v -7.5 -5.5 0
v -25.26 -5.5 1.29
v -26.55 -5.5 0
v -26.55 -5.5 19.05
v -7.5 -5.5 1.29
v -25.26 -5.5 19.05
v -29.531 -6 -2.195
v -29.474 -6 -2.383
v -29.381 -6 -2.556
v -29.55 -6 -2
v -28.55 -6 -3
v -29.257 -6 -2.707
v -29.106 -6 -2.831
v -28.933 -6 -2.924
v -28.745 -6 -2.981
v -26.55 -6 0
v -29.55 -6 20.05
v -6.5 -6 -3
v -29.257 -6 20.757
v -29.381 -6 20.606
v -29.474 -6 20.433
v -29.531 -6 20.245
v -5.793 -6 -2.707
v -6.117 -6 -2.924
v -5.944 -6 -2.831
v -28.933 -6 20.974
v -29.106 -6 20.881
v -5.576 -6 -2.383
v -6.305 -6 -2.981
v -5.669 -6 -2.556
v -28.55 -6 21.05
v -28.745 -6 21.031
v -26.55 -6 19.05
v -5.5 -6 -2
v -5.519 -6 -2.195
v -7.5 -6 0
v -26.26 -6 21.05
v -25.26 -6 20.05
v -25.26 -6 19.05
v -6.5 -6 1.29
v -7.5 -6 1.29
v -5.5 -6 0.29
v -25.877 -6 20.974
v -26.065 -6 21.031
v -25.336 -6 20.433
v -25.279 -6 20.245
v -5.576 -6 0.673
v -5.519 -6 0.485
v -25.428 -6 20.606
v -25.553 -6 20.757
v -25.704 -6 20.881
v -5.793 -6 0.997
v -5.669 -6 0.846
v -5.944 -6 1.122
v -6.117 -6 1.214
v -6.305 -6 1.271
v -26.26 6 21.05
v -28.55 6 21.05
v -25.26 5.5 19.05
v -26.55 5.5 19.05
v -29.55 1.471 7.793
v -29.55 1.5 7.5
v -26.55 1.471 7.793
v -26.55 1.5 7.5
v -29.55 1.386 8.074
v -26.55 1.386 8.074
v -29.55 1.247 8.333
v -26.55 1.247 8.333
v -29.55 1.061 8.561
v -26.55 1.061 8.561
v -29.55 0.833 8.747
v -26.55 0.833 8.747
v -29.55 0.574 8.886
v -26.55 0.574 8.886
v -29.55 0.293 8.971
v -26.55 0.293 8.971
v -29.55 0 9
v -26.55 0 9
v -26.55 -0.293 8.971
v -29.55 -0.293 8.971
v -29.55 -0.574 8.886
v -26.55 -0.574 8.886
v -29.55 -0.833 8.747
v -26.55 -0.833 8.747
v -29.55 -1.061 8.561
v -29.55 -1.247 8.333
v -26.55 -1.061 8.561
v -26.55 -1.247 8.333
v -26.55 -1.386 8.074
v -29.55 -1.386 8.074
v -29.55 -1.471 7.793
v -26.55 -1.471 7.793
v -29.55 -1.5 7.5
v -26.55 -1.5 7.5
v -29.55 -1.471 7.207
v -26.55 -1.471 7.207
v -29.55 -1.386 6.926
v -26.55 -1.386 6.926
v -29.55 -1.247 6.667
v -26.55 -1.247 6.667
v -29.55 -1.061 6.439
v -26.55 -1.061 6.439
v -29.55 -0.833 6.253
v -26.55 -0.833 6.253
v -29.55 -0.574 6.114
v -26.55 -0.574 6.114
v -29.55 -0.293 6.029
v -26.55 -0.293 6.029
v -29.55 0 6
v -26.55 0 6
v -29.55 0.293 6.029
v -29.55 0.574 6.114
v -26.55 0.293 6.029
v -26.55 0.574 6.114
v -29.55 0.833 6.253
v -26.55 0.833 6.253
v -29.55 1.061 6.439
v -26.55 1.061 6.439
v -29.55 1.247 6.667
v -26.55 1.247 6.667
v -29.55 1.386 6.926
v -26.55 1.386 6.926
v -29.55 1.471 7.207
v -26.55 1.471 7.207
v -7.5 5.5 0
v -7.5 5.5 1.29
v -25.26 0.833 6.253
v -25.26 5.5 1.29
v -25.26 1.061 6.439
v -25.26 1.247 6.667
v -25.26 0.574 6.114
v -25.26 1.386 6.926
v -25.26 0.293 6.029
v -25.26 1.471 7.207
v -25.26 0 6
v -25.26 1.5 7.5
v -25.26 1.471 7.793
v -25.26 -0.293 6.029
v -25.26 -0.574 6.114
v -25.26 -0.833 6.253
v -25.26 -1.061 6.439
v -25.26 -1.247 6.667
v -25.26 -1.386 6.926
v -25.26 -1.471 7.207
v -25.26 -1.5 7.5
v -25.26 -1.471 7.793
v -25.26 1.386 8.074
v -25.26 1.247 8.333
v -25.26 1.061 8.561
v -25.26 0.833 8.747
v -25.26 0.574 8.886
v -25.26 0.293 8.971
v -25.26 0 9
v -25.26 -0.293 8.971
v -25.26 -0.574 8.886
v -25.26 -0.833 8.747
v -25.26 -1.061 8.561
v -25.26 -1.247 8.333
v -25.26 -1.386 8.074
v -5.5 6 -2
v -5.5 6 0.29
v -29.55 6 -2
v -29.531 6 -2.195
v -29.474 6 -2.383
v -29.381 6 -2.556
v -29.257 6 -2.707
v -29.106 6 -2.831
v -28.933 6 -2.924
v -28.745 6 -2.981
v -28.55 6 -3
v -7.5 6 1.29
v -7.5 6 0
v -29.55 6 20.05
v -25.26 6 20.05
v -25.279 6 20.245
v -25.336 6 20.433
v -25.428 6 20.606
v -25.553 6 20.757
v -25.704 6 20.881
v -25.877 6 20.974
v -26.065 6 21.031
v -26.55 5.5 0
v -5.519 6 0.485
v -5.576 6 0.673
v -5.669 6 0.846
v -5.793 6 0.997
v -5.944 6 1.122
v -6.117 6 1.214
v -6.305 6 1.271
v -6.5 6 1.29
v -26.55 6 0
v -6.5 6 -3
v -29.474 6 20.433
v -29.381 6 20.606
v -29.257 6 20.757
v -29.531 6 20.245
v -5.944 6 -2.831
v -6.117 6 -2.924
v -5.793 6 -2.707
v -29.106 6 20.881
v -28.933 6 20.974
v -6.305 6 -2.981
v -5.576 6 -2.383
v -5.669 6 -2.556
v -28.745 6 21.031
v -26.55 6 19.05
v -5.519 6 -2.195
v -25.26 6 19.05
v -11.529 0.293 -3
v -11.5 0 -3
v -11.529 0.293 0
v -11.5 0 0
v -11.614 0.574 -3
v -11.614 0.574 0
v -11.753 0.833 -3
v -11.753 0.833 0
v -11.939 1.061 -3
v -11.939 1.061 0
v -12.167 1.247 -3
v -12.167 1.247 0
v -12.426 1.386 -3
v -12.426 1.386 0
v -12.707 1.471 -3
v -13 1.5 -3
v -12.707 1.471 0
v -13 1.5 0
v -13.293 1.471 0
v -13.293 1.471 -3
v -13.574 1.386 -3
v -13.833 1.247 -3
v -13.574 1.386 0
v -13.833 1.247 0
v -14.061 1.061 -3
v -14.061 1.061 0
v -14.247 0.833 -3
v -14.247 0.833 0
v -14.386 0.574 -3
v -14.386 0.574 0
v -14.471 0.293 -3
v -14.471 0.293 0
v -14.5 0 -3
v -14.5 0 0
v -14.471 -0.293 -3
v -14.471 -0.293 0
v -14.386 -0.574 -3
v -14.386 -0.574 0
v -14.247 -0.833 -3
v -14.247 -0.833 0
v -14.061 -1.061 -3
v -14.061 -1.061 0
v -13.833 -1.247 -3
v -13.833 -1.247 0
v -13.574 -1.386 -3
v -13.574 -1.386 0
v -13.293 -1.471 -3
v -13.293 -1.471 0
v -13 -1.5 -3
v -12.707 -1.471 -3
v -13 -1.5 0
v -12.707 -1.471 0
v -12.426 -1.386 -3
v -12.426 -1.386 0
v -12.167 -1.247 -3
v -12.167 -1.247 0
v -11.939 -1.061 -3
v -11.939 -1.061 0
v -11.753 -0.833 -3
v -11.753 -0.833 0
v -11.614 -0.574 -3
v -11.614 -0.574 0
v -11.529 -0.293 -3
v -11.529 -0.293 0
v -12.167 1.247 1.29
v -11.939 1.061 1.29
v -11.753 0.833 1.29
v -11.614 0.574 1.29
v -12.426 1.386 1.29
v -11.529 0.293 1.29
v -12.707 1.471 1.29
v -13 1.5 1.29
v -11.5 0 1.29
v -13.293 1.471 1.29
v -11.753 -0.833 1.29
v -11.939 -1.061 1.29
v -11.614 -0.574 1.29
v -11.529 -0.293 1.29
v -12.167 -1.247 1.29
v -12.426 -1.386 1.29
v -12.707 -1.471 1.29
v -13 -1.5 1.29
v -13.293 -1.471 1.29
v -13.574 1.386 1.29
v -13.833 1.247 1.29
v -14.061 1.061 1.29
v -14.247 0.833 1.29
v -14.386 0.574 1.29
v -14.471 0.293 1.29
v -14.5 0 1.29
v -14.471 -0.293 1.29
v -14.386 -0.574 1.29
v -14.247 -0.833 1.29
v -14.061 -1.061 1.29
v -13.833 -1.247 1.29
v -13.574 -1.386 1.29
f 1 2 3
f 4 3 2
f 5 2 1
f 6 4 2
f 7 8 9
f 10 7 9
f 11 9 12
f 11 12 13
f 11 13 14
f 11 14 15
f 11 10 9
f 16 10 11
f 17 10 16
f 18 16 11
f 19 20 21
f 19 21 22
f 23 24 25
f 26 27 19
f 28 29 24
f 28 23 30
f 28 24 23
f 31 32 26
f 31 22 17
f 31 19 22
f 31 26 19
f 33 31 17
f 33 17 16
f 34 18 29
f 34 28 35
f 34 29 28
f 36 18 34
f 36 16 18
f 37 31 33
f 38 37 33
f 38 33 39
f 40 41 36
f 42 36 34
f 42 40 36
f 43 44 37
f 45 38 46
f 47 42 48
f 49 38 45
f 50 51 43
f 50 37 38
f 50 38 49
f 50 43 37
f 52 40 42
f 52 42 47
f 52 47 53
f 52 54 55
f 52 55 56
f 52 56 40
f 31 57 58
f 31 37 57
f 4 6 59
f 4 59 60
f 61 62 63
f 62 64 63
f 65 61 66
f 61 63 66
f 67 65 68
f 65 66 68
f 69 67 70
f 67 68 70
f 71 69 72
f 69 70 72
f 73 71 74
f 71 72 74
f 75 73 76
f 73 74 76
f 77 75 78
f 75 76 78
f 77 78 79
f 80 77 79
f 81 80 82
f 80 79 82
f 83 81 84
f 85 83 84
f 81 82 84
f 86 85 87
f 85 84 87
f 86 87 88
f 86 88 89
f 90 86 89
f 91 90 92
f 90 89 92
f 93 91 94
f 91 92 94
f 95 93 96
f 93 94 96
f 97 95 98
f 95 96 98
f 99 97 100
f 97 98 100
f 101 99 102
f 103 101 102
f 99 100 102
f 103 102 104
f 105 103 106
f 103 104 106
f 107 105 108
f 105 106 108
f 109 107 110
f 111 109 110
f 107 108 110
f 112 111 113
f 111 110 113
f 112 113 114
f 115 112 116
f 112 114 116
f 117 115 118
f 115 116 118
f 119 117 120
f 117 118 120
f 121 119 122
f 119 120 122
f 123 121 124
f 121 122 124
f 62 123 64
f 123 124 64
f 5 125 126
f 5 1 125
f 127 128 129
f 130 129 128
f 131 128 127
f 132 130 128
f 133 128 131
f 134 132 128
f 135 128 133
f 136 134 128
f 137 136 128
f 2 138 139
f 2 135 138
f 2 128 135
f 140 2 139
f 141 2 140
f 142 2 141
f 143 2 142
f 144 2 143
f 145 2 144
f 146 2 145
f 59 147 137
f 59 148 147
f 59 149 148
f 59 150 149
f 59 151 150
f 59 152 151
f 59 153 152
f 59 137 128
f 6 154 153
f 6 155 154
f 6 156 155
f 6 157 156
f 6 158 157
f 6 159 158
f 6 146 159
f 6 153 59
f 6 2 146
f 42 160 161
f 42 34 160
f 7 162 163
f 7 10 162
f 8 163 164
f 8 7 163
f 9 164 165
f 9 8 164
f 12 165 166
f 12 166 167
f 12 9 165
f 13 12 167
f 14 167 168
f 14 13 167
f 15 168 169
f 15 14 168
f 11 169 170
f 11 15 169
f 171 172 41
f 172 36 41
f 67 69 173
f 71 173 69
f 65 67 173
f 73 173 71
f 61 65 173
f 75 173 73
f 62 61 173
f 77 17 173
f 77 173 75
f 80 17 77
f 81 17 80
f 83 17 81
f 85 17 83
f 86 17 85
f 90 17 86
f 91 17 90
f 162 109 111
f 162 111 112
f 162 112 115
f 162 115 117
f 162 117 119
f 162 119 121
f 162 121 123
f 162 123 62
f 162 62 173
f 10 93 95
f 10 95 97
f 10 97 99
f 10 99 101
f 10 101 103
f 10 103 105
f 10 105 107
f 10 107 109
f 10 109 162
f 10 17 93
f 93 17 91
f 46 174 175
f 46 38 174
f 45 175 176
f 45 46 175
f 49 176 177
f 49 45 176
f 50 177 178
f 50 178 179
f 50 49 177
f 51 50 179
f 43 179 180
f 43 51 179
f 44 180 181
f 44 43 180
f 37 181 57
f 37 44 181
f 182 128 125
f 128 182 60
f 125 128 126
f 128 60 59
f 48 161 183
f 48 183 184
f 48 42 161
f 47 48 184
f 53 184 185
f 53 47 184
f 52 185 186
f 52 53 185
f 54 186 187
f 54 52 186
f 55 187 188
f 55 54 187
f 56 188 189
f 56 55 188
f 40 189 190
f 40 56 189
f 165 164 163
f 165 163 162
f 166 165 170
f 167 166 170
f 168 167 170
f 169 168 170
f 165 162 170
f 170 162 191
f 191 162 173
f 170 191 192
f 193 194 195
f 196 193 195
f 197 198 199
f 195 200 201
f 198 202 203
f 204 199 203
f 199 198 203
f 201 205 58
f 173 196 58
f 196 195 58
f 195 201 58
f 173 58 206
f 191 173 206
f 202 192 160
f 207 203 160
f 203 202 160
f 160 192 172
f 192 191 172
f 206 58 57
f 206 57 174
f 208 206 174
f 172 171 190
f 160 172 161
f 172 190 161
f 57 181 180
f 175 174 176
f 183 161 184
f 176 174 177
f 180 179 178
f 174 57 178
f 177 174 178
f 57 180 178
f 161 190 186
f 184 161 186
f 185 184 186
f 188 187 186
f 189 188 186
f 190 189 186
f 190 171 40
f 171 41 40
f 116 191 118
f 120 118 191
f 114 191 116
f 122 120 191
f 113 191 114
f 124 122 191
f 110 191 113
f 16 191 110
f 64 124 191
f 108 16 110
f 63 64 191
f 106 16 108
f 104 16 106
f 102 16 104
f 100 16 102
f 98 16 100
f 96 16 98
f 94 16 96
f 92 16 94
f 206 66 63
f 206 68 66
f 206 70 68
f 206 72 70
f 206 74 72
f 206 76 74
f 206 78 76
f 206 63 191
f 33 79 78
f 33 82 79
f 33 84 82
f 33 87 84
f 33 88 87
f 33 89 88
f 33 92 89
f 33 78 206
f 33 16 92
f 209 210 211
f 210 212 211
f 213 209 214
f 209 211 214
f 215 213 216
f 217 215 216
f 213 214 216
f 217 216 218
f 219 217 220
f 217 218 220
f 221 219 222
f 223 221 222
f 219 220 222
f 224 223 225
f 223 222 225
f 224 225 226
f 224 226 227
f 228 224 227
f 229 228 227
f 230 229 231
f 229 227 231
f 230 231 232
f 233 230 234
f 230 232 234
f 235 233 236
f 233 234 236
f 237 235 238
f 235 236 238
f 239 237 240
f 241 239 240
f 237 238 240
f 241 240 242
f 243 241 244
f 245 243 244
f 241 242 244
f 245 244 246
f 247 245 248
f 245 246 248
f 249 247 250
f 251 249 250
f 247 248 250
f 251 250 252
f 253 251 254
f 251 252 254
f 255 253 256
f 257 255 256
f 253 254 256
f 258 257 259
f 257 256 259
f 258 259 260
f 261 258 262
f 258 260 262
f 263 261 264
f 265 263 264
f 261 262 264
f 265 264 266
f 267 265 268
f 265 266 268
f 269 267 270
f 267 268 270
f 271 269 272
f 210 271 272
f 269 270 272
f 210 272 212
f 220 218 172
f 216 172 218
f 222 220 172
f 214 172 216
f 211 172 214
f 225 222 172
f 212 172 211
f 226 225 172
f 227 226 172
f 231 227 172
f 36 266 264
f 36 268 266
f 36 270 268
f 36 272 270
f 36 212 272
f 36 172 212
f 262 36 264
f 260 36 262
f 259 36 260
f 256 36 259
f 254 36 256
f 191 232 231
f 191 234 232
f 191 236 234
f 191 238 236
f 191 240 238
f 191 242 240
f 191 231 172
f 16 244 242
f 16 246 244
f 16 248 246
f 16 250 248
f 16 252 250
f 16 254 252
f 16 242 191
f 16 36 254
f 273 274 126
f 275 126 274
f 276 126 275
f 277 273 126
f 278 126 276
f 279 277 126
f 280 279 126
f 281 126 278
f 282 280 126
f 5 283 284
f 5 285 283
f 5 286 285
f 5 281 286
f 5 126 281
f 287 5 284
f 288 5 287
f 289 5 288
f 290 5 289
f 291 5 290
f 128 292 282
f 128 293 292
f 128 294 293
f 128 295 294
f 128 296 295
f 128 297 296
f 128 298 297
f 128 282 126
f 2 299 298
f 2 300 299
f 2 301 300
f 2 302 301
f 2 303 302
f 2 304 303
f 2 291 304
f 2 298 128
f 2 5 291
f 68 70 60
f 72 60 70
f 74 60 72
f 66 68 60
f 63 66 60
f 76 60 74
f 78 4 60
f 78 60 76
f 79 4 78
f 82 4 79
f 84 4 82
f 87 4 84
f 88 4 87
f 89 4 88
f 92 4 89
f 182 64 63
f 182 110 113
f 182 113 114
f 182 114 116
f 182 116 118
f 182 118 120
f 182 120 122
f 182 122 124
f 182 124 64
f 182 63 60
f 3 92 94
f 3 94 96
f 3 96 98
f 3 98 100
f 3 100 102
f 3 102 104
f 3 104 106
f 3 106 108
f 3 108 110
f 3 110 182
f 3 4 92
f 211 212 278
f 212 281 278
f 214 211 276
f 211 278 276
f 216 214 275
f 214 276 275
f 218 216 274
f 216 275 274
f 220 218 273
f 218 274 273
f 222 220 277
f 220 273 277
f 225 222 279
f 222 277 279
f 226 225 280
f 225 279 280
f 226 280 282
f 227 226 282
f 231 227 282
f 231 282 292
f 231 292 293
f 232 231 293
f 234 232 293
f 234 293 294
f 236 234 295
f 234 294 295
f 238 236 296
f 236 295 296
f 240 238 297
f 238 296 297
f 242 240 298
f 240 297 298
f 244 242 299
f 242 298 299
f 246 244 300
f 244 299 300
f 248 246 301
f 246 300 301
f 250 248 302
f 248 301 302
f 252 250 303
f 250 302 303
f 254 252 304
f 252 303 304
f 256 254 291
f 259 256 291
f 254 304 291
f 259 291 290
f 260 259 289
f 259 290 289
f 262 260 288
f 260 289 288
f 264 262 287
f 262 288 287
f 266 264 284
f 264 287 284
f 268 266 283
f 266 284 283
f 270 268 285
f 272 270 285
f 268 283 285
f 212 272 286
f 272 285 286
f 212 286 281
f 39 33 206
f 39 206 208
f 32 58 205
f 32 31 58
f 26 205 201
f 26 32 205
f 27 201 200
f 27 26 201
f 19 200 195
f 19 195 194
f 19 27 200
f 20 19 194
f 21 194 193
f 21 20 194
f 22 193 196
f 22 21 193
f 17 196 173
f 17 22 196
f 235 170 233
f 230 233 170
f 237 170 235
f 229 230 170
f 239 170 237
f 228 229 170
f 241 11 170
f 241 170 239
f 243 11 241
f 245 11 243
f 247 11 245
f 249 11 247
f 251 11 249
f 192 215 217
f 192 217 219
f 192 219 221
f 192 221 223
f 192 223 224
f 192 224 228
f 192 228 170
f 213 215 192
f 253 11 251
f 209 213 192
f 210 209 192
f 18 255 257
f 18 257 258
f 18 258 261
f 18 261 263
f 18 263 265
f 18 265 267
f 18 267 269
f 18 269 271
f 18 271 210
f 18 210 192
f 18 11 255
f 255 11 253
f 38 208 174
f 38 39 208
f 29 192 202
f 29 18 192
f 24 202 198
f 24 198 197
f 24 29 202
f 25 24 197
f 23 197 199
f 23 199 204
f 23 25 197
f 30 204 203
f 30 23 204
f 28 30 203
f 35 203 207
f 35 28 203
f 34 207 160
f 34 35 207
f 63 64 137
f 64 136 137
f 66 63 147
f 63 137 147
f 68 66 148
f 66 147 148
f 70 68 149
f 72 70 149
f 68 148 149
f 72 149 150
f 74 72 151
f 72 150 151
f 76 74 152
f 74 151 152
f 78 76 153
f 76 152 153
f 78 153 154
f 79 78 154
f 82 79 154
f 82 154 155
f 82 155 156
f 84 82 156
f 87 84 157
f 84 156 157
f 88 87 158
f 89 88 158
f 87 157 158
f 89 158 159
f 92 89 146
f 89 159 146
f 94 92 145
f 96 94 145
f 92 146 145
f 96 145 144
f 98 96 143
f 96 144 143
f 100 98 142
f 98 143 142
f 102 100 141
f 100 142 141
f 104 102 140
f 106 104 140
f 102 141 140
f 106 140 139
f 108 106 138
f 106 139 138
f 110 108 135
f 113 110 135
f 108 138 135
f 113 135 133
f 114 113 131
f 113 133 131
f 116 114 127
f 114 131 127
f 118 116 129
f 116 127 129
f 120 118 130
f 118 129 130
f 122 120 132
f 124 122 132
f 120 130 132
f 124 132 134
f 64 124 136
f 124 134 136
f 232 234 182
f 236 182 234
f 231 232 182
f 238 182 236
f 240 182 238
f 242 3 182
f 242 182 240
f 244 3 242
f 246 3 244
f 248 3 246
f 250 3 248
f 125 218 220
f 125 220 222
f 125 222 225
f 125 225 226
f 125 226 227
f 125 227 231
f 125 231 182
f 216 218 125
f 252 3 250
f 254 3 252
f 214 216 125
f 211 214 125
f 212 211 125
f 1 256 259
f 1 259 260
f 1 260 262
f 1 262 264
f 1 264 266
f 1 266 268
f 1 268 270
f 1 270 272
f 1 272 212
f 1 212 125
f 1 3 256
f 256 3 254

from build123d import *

# Parameters (mm, degrees)
F2_DEPTH = 5.5
F3_W     = 1.29032
F3_H     = 2
F3_W_2   = 2
F3_H_2   = 1.29032
F4_DEPTH = 6
F5_R     = 1.5
F6_DEPTH = 12.5
F7_R     = 1.5
F8_DEPTH = 12.5
F9_R     = 1


with BuildPart() as f2:
    # F1 (on Front) → F2 (new body, symmetric)
    with BuildSketch(Plane.XZ):
        Polygon((-7.5, 0), (-7.5, 1.29032), (-25.25968, 1.29032), (-25.25968, 19.05), (-26.55, 19.05), (-26.55, 0), align=None)
    extrude(amount=F2_DEPTH, both=True)


with BuildPart() as f4:
    # F3 (on Front) → F4 (new body, symmetric)
    with BuildSketch(Plane.XZ):
        Polygon((-26.55, 0), (-26.55, 19.05), (-26.55, 21.05), (-29.55, 21.05), (-29.55, -3), (-5.5, -3), (-5.5, 0), (-7.5, 0), align=None)
        with Locations((-25.90484, 20.05)):
            Rectangle(F3_W, F3_H)
        with Locations((-6.5, 0.64516)):
            Rectangle(F3_W_2, F3_H_2)
    extrude(amount=F4_DEPTH, both=True)


with BuildPart() as f6_tool:
    # F5 (on face) → F6 (new body, symmetric)
    with BuildSketch(Plane.XY.offset(1.29032)):
        with Locations((-13, 0)):
            Circle(F5_R)
    extrude(amount=F6_DEPTH, both=True)


with BuildPart() as f2_1:
    add(f2.part)

    # F6: cut by f6_tool
    add(f6_tool.part, mode=Mode.SUBTRACT)


with BuildPart() as f4_1:
    add(f4.part)

    # F6: cut by f6_tool
    add(f6_tool.part, mode=Mode.SUBTRACT)


with BuildPart() as f8_tool:
    # F7 (on face) → F8 (new body, symmetric)
    with BuildSketch(Plane.YZ.offset(-25.25968)):
        with Locations((0, 7.5)):
            Circle(F7_R)
    extrude(amount=F8_DEPTH, both=True)


with BuildPart() as f2_2:
    add(f2_1.part)

    # F8: cut by f8_tool
    add(f8_tool.part, mode=Mode.SUBTRACT)


with BuildPart() as f4_2:
    add(f4_1.part)

    # F8: cut by f8_tool
    add(f8_tool.part, mode=Mode.SUBTRACT)

    # F9
    f9_edges = [f4_2.edges().sort_by_distance(p)[0] for p in [
        (-25.25968, 0, 21.05),
        (-5.5, 0, 1.29032),
        (-29.55, 0, 21.05),
        (-5.5, 0, -3),
        (-29.55, 0, -3),
    ]]
    fillet(f9_edges, radius=F9_R)


solid = Compound([f2_2.part, f4_2.part])
